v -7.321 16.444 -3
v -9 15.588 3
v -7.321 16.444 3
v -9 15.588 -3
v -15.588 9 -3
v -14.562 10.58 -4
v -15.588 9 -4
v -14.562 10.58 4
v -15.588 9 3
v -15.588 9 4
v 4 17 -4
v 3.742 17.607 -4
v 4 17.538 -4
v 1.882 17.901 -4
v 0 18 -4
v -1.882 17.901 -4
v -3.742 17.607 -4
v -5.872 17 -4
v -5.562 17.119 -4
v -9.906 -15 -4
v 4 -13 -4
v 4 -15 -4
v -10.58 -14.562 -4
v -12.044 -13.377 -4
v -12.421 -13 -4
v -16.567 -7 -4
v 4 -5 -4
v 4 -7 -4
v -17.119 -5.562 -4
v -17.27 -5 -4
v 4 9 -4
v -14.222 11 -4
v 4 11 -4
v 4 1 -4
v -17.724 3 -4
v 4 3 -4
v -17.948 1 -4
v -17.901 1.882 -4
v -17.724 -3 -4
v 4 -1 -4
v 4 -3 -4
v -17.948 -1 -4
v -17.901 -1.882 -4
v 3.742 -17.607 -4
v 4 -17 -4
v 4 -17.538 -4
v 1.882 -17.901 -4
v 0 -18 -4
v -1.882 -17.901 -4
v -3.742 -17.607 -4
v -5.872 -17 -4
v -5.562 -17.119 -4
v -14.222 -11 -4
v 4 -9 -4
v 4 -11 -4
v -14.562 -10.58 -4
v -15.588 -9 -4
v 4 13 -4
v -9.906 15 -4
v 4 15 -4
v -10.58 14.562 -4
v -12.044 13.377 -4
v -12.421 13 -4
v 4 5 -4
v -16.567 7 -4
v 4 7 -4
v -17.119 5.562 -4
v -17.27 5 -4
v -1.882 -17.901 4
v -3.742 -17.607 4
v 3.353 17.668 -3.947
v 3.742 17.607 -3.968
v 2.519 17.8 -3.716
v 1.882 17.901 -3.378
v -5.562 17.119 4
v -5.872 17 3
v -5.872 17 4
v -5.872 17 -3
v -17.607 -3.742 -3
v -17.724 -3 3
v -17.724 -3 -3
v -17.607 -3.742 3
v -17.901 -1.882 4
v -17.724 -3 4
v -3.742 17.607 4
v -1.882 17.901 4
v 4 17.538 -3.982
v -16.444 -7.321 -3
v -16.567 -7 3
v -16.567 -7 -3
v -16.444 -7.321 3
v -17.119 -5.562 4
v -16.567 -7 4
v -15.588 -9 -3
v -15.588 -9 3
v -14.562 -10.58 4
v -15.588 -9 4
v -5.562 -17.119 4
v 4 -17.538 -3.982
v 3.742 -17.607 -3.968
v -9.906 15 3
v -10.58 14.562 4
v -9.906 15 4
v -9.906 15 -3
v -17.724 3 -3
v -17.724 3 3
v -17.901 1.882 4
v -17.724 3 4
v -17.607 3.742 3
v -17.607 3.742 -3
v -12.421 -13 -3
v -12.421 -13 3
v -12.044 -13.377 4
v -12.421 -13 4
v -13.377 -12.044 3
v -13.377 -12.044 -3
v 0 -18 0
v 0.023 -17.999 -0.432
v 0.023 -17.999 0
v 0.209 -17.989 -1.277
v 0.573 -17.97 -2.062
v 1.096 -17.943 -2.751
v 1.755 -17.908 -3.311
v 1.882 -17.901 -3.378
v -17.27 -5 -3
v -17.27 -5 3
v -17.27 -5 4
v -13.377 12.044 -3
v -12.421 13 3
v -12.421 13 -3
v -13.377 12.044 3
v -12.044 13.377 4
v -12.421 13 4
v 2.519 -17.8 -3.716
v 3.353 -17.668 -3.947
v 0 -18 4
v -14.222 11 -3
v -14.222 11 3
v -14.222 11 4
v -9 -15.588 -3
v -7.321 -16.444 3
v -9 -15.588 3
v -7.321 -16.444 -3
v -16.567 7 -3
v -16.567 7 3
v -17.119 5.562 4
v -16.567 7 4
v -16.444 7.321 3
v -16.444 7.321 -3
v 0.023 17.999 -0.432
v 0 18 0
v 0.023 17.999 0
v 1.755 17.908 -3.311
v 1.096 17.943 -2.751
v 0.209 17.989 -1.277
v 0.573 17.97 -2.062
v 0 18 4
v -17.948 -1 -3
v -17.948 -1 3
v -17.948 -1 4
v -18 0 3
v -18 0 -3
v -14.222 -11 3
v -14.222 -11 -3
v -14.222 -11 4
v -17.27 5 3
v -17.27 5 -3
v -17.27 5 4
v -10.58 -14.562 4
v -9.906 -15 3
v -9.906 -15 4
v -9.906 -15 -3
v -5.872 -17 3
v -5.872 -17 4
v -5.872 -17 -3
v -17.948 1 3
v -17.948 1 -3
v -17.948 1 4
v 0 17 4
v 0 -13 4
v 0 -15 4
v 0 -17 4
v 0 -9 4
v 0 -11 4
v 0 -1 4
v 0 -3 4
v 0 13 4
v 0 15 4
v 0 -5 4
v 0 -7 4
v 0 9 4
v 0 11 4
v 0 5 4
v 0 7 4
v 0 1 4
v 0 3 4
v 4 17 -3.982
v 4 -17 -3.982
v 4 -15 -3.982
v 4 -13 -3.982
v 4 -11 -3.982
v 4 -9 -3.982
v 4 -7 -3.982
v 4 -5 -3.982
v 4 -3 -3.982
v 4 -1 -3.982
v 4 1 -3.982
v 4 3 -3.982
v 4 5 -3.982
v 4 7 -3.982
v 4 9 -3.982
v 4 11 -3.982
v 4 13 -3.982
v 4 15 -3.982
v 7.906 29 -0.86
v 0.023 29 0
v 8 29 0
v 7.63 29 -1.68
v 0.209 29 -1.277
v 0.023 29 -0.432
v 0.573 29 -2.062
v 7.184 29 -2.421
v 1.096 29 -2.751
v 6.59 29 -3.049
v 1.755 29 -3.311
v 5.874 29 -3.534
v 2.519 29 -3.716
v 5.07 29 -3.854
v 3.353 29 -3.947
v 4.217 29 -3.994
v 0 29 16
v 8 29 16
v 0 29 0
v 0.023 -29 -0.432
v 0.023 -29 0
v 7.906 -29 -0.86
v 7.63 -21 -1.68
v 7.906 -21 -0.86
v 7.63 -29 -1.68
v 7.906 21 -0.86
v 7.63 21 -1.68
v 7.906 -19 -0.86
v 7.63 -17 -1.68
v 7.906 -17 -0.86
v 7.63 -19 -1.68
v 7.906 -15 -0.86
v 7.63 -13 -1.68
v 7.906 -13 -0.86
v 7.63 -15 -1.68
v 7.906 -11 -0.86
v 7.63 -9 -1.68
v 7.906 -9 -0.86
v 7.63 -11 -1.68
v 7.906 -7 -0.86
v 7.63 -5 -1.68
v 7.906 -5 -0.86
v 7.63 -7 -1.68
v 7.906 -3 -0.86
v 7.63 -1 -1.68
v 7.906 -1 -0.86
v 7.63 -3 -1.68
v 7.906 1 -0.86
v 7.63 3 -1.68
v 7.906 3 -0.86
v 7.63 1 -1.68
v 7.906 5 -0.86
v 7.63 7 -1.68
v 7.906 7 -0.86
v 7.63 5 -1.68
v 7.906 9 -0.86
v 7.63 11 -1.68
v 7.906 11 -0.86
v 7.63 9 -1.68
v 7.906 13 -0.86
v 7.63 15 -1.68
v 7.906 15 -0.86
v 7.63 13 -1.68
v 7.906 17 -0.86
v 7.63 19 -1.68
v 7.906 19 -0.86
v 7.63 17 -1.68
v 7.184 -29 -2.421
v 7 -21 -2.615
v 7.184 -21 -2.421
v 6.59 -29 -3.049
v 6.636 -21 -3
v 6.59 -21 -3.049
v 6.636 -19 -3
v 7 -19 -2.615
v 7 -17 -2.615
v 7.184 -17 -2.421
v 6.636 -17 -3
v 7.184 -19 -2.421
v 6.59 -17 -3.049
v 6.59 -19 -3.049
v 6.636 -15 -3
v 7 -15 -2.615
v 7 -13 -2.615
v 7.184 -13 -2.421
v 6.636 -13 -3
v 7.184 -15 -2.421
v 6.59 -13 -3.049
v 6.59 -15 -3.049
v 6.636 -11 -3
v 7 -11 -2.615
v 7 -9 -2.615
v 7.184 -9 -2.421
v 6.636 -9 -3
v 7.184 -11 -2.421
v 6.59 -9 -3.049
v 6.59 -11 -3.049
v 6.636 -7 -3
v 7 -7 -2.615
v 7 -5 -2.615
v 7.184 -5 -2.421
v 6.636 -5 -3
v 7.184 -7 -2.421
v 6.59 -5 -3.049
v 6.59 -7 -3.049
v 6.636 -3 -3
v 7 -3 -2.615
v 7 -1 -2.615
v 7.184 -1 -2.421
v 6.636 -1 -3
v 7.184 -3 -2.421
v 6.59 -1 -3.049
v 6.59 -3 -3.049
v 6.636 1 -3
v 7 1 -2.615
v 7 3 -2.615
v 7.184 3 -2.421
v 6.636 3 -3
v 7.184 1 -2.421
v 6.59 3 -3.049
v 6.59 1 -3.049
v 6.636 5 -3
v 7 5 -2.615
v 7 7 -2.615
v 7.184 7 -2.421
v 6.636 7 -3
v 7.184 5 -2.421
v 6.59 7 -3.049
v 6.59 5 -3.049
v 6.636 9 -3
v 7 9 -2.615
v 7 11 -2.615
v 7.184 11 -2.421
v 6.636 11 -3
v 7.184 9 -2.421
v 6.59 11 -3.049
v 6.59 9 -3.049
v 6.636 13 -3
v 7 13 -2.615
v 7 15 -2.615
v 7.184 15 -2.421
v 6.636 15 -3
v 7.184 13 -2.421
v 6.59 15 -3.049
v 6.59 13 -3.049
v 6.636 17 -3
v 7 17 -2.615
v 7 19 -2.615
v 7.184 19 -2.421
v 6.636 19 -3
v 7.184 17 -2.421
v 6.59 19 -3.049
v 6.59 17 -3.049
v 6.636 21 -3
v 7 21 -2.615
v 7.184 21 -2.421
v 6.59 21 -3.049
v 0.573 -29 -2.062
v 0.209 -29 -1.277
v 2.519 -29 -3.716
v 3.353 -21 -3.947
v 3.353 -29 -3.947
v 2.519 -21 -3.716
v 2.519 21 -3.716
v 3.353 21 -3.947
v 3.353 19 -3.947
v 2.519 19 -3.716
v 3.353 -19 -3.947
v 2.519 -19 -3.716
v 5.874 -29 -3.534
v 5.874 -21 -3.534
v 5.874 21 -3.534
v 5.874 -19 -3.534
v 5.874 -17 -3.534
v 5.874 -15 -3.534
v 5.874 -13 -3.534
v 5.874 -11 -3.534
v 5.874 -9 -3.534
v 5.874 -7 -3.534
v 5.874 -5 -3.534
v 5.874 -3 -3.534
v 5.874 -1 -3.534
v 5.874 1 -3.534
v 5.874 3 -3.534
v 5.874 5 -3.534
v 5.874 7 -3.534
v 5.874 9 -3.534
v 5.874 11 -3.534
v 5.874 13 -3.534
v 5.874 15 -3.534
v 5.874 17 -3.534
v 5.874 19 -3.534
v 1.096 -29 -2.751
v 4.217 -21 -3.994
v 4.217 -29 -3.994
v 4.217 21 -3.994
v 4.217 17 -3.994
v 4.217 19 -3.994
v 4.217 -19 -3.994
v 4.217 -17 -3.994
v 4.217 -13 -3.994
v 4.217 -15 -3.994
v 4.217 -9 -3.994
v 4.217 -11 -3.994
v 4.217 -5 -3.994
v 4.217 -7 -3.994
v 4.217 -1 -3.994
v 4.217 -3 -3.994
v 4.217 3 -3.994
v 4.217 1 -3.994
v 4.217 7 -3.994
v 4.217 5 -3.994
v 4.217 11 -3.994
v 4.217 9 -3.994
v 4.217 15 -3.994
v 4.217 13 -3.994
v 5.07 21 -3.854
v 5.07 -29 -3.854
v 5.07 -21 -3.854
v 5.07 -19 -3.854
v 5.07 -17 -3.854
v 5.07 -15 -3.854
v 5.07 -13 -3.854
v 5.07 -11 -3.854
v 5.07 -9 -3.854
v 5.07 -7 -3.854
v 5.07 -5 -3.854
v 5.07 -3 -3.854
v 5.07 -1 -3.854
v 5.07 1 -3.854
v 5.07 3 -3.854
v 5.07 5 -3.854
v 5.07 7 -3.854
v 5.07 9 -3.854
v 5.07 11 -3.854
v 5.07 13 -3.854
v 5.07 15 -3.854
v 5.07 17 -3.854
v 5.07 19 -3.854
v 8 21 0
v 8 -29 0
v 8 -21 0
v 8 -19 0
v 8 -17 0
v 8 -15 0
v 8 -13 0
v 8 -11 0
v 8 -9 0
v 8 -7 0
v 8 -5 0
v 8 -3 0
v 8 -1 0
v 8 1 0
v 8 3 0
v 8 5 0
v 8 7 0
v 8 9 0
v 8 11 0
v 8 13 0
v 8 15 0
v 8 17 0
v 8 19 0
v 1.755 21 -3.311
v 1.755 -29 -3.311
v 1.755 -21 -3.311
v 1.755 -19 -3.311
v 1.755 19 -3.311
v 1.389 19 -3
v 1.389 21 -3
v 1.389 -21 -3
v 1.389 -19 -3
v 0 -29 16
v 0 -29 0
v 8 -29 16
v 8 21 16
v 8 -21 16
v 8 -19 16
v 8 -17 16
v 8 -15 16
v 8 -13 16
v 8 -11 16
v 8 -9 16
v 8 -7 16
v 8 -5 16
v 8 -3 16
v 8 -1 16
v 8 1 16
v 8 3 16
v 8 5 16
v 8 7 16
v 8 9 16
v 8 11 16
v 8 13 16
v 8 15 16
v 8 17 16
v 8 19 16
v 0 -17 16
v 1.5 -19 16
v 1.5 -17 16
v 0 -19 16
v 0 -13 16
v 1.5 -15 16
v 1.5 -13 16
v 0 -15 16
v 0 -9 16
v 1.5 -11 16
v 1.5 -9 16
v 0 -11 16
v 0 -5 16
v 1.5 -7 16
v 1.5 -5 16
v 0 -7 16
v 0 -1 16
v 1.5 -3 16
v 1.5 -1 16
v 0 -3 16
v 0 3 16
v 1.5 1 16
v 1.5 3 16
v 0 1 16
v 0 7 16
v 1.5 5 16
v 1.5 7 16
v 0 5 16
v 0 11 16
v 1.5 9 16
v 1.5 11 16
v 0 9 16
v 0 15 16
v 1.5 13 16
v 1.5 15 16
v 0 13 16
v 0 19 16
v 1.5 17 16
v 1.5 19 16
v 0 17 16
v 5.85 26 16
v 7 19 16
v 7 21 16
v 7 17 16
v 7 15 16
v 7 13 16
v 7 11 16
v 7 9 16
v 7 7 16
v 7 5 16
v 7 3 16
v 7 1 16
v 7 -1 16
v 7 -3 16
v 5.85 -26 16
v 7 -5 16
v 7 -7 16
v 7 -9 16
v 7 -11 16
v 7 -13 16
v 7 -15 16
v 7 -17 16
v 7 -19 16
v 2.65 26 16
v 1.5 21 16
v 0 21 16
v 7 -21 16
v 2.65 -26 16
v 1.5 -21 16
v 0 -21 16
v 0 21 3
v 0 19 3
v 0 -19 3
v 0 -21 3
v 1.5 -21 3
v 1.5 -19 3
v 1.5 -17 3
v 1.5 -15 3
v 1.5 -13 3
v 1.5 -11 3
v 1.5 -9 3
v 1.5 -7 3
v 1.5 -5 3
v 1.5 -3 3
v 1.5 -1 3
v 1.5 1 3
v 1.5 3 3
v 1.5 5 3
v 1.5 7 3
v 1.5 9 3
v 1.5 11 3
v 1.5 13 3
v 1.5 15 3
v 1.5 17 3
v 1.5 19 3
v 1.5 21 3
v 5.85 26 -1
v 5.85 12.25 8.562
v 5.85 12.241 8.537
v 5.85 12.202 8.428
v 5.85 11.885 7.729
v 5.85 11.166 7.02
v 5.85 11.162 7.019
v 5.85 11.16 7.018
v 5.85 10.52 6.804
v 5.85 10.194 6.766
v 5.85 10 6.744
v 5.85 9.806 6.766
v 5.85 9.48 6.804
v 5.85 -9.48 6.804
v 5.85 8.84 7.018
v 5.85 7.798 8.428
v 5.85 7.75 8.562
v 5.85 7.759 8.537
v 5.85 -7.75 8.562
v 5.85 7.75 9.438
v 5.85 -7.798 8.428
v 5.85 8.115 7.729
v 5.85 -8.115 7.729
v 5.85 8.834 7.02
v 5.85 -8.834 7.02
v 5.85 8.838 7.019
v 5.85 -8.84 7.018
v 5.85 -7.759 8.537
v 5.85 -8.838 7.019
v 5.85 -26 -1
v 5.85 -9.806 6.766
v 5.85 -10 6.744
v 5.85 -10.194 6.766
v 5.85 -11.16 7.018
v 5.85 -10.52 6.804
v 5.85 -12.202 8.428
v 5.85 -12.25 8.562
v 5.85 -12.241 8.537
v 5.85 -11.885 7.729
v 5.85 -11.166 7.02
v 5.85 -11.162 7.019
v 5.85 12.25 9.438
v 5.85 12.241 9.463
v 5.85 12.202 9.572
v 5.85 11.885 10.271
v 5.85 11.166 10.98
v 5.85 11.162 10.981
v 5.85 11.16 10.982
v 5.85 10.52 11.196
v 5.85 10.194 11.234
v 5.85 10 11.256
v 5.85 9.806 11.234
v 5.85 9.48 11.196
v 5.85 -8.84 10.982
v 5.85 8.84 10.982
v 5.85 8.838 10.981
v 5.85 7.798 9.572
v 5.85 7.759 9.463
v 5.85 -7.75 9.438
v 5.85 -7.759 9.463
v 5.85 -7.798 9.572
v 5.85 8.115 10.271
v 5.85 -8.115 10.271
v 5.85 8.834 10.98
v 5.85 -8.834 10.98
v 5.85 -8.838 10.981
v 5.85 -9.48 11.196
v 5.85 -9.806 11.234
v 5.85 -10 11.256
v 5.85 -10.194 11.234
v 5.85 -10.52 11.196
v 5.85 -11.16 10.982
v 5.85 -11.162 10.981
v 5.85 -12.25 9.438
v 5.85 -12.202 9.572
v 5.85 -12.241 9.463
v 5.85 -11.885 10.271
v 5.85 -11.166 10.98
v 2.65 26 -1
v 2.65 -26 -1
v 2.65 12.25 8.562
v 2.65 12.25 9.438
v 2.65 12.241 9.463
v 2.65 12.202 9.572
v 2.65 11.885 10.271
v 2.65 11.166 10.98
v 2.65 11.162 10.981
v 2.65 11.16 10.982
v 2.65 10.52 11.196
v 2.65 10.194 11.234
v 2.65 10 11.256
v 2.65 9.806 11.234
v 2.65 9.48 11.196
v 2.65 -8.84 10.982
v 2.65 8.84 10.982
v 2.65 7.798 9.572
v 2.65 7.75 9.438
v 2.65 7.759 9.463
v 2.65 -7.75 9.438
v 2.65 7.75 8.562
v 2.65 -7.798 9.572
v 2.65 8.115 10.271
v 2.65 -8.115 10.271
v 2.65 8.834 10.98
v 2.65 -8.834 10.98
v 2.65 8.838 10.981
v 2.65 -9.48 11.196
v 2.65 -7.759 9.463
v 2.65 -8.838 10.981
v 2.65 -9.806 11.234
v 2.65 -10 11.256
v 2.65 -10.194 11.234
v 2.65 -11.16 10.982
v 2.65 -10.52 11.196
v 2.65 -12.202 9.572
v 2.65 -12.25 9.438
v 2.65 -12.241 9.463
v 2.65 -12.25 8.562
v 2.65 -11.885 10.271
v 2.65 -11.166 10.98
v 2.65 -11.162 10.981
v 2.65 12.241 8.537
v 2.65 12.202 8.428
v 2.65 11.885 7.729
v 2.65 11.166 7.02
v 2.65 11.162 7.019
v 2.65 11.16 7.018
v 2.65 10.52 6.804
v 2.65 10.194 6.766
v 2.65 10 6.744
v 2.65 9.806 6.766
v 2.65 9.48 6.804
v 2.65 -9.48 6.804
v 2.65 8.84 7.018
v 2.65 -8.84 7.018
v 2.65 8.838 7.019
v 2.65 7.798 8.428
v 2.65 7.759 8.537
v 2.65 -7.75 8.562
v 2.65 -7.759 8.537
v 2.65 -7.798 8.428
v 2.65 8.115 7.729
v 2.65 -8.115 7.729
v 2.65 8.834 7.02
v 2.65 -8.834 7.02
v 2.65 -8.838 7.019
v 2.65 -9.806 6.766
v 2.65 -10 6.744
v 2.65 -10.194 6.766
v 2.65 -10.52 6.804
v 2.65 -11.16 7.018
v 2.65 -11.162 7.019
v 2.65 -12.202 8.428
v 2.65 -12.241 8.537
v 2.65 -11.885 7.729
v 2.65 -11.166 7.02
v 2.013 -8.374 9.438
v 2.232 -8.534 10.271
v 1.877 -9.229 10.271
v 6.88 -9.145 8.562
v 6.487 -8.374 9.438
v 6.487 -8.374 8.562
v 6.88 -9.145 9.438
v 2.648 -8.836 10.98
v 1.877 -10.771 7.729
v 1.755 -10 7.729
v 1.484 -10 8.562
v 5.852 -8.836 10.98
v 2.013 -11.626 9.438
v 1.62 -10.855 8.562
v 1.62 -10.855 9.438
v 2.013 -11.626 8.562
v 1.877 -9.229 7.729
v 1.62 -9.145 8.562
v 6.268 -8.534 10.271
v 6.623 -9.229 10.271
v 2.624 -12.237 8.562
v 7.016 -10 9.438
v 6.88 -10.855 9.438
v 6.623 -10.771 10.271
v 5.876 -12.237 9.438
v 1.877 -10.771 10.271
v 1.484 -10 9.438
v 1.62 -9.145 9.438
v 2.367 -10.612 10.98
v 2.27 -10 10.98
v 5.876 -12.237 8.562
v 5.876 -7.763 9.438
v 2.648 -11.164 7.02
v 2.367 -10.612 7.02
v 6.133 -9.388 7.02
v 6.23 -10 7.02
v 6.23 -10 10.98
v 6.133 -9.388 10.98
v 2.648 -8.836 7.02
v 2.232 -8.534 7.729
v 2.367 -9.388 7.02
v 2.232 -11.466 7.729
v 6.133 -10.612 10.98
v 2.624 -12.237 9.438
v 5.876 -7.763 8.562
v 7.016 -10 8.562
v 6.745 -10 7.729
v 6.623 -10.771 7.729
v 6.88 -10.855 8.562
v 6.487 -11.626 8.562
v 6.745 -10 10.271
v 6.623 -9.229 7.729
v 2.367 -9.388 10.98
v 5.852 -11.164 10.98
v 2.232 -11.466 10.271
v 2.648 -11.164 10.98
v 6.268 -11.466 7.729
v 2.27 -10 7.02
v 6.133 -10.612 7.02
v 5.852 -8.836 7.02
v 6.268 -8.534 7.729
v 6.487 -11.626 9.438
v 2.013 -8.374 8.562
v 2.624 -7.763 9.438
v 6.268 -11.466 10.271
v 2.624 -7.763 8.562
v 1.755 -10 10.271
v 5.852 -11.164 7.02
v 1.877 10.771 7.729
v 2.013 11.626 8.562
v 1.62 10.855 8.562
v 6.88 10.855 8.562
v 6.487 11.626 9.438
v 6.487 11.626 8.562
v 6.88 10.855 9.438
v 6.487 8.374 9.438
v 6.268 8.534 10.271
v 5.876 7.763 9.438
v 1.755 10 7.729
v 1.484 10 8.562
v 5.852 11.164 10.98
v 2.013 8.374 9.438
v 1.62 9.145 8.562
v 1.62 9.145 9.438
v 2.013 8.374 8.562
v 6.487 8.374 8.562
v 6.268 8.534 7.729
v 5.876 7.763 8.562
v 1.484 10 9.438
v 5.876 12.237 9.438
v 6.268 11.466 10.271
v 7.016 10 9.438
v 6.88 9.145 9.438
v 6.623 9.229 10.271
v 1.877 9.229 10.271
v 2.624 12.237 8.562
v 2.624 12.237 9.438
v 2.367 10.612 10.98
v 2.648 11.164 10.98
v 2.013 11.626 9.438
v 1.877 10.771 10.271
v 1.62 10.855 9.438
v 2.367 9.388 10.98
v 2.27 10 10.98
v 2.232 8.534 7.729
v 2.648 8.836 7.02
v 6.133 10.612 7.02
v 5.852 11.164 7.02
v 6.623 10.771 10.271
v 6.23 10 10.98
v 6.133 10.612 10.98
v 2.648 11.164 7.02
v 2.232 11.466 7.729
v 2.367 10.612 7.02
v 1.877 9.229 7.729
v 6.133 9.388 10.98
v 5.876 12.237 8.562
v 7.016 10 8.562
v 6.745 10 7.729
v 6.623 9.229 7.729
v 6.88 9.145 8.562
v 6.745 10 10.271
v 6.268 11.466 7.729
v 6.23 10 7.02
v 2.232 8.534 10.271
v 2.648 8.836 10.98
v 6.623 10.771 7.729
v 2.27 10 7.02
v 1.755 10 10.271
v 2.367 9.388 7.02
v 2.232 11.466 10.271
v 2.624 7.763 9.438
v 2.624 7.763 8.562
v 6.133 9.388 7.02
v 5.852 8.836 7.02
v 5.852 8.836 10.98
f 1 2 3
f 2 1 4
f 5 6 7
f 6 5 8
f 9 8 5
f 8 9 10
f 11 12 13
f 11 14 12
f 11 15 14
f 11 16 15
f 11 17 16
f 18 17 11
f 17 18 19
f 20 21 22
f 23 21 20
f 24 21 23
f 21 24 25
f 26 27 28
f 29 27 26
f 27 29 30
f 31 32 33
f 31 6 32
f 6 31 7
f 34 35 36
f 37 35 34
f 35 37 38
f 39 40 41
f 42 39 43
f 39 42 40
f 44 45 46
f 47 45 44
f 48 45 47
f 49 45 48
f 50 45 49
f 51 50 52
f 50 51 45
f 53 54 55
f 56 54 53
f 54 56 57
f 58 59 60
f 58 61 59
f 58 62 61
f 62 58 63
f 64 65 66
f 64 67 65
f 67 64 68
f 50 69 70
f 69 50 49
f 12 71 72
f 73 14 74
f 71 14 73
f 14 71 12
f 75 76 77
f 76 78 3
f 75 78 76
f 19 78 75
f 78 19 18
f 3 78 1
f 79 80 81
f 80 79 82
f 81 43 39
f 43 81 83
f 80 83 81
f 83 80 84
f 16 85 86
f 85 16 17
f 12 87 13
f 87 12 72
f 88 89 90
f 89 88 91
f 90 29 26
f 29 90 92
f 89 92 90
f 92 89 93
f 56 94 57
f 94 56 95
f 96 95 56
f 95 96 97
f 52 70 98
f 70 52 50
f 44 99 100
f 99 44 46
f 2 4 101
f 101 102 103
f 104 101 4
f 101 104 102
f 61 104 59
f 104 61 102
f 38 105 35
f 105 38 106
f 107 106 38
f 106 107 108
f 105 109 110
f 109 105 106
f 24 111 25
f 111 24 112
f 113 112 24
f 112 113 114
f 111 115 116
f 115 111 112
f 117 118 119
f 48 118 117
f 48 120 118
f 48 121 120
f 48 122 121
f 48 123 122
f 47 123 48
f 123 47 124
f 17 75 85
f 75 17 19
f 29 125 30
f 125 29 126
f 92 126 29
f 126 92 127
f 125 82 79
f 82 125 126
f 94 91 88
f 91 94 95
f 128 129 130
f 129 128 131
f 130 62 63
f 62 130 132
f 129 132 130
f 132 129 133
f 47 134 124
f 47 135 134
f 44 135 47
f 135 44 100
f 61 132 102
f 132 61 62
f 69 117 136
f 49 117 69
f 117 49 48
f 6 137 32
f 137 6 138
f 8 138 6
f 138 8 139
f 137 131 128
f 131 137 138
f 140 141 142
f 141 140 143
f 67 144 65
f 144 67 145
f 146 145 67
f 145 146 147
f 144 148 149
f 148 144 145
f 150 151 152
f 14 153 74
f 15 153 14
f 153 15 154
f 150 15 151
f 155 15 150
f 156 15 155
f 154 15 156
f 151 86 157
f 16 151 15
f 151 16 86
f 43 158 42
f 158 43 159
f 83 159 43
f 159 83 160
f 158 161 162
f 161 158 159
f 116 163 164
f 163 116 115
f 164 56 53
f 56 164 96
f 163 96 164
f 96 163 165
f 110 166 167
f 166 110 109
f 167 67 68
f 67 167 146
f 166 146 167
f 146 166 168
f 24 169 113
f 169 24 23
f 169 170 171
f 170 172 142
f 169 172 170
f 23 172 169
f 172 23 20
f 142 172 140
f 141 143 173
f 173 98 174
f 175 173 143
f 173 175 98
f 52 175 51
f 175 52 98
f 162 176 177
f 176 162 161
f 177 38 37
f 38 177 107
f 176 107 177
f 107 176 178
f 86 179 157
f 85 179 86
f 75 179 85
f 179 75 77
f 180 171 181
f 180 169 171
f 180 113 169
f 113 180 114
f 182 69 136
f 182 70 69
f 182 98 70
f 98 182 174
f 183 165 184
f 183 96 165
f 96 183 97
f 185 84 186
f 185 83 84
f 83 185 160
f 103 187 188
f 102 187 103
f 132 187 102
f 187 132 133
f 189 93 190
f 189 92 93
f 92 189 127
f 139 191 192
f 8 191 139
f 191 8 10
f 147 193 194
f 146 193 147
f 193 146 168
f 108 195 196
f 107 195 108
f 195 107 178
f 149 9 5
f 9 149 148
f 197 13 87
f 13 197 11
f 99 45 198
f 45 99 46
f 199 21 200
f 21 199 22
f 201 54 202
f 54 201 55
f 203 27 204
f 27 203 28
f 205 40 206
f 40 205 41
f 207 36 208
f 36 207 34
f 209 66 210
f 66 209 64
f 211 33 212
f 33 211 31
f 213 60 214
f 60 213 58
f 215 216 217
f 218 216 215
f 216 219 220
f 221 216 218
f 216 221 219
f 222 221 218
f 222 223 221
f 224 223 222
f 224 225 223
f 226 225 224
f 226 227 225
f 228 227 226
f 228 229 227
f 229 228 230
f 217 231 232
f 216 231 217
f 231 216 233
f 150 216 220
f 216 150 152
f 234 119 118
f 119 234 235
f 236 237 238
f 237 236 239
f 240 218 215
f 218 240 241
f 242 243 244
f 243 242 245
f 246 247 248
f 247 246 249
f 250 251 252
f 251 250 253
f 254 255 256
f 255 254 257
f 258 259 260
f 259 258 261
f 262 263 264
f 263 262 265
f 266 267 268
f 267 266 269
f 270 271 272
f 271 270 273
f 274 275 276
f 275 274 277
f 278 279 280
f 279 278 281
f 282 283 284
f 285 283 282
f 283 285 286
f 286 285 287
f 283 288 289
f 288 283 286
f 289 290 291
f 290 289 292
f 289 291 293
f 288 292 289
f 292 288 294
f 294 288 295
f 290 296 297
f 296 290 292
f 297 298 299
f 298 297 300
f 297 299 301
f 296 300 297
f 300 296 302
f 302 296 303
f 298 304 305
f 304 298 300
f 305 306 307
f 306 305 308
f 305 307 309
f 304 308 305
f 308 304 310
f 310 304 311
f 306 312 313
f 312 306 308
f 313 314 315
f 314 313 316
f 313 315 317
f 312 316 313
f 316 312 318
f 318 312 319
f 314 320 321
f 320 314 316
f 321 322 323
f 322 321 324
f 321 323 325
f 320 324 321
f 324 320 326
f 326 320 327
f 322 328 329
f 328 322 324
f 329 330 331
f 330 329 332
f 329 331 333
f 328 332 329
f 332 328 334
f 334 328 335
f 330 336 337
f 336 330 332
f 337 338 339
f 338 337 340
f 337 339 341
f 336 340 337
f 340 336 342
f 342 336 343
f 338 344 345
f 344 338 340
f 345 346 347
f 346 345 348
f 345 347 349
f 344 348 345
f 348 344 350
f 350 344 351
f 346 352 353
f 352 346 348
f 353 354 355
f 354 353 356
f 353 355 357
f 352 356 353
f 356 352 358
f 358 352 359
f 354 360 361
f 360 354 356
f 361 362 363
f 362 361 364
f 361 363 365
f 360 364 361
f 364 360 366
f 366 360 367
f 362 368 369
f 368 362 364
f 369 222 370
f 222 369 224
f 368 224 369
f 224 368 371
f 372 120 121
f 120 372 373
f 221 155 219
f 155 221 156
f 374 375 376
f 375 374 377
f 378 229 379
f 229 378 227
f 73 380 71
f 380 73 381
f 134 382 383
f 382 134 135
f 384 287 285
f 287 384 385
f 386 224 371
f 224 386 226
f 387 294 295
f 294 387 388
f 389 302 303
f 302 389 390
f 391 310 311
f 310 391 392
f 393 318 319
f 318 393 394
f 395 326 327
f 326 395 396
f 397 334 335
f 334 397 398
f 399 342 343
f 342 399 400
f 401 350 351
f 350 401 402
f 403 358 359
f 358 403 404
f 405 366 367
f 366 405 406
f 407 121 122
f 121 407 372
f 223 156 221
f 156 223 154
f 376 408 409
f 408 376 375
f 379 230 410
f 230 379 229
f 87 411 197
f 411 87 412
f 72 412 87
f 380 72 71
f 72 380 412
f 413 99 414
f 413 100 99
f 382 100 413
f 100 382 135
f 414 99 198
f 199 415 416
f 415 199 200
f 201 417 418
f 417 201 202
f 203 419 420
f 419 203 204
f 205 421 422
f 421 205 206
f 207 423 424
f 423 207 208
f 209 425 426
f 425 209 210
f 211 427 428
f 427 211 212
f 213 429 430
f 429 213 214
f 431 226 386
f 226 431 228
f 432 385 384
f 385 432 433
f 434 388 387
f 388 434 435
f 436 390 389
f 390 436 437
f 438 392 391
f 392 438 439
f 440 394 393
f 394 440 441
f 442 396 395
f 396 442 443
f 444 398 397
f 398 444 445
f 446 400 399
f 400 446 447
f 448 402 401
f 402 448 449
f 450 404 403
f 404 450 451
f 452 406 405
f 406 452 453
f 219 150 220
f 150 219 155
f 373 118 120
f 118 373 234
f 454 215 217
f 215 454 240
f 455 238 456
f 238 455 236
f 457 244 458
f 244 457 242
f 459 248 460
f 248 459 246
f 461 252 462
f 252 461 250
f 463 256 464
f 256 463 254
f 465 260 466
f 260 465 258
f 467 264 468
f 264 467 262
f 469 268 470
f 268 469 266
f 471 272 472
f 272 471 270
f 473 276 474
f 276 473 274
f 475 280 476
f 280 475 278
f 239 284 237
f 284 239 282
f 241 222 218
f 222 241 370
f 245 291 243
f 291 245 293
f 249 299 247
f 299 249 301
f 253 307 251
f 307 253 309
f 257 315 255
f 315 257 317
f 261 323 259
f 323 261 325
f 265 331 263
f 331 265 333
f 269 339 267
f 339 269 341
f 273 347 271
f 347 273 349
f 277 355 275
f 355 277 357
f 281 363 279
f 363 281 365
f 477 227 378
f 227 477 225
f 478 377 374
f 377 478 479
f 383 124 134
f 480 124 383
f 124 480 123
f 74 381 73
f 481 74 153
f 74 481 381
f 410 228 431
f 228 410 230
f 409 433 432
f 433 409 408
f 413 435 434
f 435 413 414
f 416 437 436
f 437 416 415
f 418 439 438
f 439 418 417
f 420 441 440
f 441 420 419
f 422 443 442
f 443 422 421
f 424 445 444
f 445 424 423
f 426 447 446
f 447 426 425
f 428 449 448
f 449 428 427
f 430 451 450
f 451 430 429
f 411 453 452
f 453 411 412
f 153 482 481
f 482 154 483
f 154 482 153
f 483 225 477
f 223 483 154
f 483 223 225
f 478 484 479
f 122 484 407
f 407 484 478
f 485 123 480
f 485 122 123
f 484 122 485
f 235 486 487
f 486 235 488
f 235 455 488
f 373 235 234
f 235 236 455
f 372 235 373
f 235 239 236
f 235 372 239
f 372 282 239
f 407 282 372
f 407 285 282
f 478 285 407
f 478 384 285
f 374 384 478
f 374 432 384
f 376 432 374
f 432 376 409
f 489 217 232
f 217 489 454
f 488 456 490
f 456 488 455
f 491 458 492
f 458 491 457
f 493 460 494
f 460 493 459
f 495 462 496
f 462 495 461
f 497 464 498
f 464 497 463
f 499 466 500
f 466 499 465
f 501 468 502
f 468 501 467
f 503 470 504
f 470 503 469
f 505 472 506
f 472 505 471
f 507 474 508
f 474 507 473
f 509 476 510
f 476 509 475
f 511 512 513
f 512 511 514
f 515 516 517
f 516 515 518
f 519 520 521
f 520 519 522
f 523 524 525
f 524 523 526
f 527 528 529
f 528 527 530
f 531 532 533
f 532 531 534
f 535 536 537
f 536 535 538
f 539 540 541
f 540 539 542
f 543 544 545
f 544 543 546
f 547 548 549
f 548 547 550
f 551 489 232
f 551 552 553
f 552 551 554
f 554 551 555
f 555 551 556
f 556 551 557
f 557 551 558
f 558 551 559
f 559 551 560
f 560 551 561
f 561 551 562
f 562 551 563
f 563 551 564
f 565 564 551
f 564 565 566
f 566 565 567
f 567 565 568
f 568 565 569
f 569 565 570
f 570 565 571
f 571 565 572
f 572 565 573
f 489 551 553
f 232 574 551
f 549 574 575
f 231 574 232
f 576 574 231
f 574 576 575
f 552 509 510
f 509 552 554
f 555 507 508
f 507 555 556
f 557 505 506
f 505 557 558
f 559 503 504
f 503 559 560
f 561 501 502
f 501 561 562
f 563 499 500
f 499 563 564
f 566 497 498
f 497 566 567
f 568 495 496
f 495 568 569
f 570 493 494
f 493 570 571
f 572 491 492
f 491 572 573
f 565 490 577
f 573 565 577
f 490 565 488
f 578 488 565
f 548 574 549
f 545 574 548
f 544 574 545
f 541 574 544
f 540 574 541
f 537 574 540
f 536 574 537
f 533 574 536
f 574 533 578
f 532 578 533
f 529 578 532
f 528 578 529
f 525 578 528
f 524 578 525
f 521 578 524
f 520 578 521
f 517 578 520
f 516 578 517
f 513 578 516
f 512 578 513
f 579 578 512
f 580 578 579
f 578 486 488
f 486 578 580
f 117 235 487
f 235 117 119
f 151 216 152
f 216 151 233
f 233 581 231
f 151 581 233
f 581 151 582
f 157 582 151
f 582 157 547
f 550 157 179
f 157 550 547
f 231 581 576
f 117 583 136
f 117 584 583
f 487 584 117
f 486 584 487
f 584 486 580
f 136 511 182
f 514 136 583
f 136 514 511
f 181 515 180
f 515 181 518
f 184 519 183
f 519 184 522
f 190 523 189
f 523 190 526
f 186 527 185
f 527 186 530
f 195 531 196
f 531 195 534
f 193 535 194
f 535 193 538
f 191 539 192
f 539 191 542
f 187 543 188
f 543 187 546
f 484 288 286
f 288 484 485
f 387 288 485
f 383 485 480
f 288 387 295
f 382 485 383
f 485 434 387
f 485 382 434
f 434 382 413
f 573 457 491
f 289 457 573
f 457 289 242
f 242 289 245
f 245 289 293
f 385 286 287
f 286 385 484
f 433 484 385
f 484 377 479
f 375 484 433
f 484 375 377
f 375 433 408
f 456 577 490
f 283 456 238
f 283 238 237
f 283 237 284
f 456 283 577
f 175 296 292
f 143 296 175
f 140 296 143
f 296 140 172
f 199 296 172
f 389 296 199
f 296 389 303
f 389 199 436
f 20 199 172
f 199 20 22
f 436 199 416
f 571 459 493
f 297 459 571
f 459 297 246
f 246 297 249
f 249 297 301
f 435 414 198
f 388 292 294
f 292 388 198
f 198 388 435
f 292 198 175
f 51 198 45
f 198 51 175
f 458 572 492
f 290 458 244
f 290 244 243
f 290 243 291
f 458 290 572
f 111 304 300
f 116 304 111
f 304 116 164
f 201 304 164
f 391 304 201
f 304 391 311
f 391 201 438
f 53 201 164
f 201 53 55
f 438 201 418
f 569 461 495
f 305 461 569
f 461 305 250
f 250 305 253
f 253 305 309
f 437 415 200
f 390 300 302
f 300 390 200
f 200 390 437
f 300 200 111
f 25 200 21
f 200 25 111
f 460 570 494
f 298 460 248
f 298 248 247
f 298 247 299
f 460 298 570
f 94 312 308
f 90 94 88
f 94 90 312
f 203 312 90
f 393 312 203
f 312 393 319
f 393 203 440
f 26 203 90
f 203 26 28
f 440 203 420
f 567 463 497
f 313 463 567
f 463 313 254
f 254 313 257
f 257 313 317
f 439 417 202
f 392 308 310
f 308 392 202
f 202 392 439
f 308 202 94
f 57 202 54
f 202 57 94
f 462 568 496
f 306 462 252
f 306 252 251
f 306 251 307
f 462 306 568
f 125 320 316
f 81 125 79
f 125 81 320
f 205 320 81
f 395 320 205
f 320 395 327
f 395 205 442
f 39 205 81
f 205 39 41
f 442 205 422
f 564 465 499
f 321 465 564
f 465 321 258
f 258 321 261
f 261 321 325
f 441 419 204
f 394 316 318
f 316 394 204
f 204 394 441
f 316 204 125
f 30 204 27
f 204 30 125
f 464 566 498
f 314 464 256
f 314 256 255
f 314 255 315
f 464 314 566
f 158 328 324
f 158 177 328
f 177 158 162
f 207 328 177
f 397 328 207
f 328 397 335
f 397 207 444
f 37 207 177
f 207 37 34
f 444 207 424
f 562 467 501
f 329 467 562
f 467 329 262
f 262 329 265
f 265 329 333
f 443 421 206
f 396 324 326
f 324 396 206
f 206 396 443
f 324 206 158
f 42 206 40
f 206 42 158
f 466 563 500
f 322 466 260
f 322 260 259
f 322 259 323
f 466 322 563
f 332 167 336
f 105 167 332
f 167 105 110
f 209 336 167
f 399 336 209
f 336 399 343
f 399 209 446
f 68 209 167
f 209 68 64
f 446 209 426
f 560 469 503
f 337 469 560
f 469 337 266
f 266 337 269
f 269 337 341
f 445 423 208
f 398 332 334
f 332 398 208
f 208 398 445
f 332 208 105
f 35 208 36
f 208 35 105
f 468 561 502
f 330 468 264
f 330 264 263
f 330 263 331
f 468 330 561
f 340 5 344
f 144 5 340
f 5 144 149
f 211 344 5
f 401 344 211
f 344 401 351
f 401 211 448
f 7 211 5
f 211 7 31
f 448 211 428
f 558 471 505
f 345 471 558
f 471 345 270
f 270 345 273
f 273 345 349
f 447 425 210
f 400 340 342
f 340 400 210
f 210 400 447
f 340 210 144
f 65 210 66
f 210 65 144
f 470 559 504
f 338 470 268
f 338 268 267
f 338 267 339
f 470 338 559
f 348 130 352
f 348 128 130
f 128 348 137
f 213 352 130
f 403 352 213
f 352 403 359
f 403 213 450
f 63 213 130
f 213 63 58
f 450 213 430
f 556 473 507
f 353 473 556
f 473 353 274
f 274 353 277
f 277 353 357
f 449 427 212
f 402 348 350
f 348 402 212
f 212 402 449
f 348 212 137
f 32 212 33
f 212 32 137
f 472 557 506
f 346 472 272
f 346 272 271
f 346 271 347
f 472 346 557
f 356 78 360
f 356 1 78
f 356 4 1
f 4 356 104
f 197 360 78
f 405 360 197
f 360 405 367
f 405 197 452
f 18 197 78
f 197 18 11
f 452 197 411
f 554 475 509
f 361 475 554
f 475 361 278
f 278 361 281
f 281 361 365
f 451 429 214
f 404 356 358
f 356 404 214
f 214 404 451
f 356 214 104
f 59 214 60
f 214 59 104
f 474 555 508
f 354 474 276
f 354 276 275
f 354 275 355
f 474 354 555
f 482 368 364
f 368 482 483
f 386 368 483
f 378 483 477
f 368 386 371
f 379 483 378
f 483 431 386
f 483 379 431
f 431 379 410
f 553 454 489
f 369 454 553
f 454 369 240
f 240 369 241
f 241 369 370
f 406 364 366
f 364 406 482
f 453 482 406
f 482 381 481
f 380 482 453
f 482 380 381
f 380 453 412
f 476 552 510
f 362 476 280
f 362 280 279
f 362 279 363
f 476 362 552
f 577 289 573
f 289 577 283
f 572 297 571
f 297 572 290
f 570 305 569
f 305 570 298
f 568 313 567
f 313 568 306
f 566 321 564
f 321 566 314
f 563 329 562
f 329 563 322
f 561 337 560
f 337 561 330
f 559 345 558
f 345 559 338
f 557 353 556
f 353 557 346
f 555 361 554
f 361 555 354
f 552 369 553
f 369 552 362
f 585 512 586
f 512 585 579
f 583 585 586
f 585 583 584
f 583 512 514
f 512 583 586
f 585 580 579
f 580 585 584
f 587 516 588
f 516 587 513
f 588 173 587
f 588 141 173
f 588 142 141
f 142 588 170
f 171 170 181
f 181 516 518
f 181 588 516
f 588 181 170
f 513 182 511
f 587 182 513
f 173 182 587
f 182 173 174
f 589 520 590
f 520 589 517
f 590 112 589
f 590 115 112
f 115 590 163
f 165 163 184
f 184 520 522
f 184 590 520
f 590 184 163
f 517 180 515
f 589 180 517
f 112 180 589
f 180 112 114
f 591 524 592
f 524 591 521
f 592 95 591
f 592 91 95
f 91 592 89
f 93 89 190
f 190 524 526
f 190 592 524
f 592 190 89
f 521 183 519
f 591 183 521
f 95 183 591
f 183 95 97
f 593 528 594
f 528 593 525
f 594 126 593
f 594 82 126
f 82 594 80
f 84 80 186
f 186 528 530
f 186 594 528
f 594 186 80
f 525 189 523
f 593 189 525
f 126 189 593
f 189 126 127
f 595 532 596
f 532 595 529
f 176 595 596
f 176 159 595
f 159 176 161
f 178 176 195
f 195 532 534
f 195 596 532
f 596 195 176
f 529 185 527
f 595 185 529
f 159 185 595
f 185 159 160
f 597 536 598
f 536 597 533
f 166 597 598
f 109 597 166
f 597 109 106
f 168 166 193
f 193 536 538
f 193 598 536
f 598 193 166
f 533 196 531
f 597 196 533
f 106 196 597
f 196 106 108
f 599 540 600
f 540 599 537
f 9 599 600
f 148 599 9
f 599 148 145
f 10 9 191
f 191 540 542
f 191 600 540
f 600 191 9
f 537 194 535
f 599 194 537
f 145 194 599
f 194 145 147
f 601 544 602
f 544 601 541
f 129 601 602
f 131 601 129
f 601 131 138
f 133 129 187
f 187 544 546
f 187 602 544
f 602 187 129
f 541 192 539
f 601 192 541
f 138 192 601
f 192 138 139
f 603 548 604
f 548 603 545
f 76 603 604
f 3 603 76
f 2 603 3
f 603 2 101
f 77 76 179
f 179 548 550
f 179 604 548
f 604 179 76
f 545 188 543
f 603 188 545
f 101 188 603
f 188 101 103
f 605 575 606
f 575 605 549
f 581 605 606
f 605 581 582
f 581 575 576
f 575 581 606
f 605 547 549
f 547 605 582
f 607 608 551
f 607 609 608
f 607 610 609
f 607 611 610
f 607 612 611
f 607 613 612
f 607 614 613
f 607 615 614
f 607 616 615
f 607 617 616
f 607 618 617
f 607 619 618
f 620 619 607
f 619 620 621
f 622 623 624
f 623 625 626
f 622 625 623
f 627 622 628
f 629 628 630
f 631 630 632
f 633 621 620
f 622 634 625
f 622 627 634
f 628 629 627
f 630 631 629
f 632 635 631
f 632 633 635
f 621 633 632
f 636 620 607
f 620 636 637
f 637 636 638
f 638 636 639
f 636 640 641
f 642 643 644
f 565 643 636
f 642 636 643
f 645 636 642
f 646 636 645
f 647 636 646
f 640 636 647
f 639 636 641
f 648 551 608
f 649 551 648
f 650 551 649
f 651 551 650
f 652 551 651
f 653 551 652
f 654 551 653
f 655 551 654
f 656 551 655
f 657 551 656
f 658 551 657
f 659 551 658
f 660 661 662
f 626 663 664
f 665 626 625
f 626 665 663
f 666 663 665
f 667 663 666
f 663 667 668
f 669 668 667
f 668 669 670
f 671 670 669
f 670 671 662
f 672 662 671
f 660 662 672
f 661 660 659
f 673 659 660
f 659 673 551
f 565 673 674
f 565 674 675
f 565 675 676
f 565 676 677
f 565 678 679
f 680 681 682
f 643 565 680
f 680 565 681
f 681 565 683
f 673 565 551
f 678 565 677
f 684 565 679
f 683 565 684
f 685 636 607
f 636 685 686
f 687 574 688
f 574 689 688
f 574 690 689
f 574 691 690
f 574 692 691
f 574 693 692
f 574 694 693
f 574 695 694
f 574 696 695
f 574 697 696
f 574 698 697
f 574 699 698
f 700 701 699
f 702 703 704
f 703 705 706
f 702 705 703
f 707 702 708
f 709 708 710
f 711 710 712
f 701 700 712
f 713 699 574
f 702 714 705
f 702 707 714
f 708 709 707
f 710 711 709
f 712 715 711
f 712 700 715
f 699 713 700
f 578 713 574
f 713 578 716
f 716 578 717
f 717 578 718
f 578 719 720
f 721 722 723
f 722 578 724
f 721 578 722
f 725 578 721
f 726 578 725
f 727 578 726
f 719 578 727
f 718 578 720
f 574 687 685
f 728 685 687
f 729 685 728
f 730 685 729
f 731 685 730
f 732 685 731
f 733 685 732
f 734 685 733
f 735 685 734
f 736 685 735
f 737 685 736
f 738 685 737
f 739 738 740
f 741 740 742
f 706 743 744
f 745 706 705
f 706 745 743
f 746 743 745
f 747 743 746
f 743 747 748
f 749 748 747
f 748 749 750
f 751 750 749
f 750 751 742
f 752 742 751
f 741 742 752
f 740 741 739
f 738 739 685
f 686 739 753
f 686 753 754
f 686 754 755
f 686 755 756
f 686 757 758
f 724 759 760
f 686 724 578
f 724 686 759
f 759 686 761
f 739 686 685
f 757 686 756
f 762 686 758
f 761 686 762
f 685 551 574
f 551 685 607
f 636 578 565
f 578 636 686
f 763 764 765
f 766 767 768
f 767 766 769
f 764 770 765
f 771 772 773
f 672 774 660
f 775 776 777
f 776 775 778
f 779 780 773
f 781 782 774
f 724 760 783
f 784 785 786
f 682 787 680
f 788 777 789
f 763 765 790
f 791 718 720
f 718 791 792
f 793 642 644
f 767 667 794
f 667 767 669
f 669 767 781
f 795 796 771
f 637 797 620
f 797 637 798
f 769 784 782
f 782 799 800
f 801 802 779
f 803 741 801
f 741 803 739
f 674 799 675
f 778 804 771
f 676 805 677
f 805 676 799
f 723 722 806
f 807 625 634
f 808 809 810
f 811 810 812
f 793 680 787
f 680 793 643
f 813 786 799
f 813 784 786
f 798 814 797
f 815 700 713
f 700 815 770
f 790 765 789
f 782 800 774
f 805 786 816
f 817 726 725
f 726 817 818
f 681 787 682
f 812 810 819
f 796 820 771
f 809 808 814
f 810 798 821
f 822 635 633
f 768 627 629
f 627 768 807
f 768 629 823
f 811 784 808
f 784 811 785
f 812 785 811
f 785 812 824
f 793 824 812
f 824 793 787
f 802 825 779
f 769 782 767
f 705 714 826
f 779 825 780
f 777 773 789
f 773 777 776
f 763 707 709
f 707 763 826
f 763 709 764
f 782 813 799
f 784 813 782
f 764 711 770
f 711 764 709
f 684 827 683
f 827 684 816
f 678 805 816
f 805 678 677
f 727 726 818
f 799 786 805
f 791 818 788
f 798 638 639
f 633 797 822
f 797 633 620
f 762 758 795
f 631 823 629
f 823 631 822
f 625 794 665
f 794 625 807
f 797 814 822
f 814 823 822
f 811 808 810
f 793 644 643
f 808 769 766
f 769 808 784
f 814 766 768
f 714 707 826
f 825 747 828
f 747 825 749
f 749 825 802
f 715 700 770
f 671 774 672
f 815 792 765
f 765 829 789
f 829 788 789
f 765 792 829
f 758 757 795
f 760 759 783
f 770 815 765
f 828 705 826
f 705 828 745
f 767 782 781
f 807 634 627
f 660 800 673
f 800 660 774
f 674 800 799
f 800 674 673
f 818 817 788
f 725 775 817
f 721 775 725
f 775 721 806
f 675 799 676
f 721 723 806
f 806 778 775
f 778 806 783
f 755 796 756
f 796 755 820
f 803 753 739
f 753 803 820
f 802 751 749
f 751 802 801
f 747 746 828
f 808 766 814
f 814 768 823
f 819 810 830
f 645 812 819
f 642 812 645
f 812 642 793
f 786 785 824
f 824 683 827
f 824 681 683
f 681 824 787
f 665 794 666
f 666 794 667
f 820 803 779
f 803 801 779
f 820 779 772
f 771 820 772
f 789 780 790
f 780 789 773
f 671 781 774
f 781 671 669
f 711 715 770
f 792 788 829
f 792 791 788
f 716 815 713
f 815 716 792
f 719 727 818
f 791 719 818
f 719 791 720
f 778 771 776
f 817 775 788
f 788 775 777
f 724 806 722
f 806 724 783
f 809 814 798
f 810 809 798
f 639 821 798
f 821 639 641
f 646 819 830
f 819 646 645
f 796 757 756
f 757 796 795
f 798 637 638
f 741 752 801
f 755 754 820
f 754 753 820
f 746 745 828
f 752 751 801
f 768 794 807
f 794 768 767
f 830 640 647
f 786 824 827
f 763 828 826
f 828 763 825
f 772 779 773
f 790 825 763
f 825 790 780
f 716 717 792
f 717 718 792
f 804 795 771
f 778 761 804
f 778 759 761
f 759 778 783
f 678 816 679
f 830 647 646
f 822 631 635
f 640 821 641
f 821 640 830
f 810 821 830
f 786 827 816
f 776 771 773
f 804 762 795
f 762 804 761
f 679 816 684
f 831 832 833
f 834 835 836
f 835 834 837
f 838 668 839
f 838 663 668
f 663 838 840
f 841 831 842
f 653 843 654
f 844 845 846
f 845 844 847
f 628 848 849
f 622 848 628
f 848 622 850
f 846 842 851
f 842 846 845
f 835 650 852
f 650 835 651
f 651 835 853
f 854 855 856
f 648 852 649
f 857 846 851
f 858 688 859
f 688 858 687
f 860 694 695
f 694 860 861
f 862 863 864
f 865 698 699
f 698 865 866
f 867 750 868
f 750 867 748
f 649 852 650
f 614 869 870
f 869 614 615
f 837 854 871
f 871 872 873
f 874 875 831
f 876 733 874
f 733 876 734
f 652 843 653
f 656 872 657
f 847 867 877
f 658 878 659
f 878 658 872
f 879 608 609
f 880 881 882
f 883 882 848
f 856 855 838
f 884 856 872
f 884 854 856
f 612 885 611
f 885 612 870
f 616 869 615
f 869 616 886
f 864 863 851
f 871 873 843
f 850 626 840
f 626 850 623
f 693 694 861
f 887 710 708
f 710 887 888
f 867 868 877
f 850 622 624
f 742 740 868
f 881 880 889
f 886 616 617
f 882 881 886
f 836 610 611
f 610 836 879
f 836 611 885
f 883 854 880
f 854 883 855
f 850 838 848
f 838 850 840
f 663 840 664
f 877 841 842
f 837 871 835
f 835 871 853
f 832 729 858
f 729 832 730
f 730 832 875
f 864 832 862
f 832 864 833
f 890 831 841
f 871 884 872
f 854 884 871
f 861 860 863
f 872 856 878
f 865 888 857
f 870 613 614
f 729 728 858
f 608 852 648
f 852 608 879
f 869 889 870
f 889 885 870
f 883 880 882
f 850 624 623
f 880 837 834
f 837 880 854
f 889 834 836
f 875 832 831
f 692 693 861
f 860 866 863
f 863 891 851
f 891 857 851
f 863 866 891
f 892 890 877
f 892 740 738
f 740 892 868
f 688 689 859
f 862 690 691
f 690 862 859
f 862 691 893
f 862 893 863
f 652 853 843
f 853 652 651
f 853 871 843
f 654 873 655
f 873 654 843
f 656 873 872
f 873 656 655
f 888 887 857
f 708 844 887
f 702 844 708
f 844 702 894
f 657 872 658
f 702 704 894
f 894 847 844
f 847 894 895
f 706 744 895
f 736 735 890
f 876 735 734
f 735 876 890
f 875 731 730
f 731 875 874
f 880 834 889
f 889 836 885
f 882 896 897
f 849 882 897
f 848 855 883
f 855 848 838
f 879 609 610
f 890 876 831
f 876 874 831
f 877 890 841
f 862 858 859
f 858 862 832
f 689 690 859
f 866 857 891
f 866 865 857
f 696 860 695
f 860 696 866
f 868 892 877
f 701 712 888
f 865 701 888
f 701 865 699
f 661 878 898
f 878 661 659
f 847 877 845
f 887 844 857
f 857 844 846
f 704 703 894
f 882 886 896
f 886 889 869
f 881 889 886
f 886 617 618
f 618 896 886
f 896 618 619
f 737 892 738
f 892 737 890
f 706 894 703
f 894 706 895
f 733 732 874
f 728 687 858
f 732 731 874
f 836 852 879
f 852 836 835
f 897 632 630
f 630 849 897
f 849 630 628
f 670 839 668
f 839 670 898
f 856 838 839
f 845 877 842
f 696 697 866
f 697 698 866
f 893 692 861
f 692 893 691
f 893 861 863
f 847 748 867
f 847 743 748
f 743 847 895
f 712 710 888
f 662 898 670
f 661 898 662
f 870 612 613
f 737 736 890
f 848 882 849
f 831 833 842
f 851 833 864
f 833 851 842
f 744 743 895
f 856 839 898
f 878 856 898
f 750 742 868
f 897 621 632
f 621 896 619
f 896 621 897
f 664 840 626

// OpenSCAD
///////////////////////////////////////////////////
//
// Charcoal grill vent handle compatible to Weber
// Kettle Series, Master-Touch, Performance Series
//
// Possible replacement for rubber/plastic vent handle
// Weber part no: 63048
// 
// Autor: Dipl.-Ing. Peter Niehues
// Version: 03 
// Date: March 2015
//
// CC BY-NC-SA
//
///////////////////////////////////////////////////

// Material: ABS
// Nozzle: 0.5mm

// Tipp: Clean top of printed part with wire brush 
// to remove the first printing layer

$fa=6;
$fs=.875;

module body(){
  difference(){
    cylinder(h=8, r=18, center=true);
    translate([24,0,0])
      cube([40,50,20], center =true);
  } // difference
  difference(){
  translate([4,0,0])
    rotate([90,0,0])
      cylinder(h=58,r=4, center=true);
  } //difference
  translate([4,0,8])
    cube([8,58,16], center=true); 
  

  
} // module

module ribs(){
  for ( i = [-20 : 4 : 20] ) {
    translate([0,i,-8])
      cube([50,2,10], center=true);
  } // for
  for ( i = [-20 : 4 : 20] ) {
    translate([12,i,0])
      cube([10,2,50], center=true);
  } // for
  for ( i = [-20 : 4 : 20] ) {
    translate([-11,i,13])
      cube([25,2,20], center=true);
  } // for
} // module

module slot(){
  translate([0,0,0])
    cube([3.2,52,18], center=true);
  translate([0,-10,1])
    sphere(2.8, $fn=20);
  translate([0,10,1])
    sphere(2.8, $fn=20);
} // module

difference(){
  body();
  ribs();
  translate([4.25,0,8])
    slot();
} // difference
//

///////////////////////////////////////////////////
//
// End of weber charcoal grill vent handle
//
///////////////////////////////////////////////////
